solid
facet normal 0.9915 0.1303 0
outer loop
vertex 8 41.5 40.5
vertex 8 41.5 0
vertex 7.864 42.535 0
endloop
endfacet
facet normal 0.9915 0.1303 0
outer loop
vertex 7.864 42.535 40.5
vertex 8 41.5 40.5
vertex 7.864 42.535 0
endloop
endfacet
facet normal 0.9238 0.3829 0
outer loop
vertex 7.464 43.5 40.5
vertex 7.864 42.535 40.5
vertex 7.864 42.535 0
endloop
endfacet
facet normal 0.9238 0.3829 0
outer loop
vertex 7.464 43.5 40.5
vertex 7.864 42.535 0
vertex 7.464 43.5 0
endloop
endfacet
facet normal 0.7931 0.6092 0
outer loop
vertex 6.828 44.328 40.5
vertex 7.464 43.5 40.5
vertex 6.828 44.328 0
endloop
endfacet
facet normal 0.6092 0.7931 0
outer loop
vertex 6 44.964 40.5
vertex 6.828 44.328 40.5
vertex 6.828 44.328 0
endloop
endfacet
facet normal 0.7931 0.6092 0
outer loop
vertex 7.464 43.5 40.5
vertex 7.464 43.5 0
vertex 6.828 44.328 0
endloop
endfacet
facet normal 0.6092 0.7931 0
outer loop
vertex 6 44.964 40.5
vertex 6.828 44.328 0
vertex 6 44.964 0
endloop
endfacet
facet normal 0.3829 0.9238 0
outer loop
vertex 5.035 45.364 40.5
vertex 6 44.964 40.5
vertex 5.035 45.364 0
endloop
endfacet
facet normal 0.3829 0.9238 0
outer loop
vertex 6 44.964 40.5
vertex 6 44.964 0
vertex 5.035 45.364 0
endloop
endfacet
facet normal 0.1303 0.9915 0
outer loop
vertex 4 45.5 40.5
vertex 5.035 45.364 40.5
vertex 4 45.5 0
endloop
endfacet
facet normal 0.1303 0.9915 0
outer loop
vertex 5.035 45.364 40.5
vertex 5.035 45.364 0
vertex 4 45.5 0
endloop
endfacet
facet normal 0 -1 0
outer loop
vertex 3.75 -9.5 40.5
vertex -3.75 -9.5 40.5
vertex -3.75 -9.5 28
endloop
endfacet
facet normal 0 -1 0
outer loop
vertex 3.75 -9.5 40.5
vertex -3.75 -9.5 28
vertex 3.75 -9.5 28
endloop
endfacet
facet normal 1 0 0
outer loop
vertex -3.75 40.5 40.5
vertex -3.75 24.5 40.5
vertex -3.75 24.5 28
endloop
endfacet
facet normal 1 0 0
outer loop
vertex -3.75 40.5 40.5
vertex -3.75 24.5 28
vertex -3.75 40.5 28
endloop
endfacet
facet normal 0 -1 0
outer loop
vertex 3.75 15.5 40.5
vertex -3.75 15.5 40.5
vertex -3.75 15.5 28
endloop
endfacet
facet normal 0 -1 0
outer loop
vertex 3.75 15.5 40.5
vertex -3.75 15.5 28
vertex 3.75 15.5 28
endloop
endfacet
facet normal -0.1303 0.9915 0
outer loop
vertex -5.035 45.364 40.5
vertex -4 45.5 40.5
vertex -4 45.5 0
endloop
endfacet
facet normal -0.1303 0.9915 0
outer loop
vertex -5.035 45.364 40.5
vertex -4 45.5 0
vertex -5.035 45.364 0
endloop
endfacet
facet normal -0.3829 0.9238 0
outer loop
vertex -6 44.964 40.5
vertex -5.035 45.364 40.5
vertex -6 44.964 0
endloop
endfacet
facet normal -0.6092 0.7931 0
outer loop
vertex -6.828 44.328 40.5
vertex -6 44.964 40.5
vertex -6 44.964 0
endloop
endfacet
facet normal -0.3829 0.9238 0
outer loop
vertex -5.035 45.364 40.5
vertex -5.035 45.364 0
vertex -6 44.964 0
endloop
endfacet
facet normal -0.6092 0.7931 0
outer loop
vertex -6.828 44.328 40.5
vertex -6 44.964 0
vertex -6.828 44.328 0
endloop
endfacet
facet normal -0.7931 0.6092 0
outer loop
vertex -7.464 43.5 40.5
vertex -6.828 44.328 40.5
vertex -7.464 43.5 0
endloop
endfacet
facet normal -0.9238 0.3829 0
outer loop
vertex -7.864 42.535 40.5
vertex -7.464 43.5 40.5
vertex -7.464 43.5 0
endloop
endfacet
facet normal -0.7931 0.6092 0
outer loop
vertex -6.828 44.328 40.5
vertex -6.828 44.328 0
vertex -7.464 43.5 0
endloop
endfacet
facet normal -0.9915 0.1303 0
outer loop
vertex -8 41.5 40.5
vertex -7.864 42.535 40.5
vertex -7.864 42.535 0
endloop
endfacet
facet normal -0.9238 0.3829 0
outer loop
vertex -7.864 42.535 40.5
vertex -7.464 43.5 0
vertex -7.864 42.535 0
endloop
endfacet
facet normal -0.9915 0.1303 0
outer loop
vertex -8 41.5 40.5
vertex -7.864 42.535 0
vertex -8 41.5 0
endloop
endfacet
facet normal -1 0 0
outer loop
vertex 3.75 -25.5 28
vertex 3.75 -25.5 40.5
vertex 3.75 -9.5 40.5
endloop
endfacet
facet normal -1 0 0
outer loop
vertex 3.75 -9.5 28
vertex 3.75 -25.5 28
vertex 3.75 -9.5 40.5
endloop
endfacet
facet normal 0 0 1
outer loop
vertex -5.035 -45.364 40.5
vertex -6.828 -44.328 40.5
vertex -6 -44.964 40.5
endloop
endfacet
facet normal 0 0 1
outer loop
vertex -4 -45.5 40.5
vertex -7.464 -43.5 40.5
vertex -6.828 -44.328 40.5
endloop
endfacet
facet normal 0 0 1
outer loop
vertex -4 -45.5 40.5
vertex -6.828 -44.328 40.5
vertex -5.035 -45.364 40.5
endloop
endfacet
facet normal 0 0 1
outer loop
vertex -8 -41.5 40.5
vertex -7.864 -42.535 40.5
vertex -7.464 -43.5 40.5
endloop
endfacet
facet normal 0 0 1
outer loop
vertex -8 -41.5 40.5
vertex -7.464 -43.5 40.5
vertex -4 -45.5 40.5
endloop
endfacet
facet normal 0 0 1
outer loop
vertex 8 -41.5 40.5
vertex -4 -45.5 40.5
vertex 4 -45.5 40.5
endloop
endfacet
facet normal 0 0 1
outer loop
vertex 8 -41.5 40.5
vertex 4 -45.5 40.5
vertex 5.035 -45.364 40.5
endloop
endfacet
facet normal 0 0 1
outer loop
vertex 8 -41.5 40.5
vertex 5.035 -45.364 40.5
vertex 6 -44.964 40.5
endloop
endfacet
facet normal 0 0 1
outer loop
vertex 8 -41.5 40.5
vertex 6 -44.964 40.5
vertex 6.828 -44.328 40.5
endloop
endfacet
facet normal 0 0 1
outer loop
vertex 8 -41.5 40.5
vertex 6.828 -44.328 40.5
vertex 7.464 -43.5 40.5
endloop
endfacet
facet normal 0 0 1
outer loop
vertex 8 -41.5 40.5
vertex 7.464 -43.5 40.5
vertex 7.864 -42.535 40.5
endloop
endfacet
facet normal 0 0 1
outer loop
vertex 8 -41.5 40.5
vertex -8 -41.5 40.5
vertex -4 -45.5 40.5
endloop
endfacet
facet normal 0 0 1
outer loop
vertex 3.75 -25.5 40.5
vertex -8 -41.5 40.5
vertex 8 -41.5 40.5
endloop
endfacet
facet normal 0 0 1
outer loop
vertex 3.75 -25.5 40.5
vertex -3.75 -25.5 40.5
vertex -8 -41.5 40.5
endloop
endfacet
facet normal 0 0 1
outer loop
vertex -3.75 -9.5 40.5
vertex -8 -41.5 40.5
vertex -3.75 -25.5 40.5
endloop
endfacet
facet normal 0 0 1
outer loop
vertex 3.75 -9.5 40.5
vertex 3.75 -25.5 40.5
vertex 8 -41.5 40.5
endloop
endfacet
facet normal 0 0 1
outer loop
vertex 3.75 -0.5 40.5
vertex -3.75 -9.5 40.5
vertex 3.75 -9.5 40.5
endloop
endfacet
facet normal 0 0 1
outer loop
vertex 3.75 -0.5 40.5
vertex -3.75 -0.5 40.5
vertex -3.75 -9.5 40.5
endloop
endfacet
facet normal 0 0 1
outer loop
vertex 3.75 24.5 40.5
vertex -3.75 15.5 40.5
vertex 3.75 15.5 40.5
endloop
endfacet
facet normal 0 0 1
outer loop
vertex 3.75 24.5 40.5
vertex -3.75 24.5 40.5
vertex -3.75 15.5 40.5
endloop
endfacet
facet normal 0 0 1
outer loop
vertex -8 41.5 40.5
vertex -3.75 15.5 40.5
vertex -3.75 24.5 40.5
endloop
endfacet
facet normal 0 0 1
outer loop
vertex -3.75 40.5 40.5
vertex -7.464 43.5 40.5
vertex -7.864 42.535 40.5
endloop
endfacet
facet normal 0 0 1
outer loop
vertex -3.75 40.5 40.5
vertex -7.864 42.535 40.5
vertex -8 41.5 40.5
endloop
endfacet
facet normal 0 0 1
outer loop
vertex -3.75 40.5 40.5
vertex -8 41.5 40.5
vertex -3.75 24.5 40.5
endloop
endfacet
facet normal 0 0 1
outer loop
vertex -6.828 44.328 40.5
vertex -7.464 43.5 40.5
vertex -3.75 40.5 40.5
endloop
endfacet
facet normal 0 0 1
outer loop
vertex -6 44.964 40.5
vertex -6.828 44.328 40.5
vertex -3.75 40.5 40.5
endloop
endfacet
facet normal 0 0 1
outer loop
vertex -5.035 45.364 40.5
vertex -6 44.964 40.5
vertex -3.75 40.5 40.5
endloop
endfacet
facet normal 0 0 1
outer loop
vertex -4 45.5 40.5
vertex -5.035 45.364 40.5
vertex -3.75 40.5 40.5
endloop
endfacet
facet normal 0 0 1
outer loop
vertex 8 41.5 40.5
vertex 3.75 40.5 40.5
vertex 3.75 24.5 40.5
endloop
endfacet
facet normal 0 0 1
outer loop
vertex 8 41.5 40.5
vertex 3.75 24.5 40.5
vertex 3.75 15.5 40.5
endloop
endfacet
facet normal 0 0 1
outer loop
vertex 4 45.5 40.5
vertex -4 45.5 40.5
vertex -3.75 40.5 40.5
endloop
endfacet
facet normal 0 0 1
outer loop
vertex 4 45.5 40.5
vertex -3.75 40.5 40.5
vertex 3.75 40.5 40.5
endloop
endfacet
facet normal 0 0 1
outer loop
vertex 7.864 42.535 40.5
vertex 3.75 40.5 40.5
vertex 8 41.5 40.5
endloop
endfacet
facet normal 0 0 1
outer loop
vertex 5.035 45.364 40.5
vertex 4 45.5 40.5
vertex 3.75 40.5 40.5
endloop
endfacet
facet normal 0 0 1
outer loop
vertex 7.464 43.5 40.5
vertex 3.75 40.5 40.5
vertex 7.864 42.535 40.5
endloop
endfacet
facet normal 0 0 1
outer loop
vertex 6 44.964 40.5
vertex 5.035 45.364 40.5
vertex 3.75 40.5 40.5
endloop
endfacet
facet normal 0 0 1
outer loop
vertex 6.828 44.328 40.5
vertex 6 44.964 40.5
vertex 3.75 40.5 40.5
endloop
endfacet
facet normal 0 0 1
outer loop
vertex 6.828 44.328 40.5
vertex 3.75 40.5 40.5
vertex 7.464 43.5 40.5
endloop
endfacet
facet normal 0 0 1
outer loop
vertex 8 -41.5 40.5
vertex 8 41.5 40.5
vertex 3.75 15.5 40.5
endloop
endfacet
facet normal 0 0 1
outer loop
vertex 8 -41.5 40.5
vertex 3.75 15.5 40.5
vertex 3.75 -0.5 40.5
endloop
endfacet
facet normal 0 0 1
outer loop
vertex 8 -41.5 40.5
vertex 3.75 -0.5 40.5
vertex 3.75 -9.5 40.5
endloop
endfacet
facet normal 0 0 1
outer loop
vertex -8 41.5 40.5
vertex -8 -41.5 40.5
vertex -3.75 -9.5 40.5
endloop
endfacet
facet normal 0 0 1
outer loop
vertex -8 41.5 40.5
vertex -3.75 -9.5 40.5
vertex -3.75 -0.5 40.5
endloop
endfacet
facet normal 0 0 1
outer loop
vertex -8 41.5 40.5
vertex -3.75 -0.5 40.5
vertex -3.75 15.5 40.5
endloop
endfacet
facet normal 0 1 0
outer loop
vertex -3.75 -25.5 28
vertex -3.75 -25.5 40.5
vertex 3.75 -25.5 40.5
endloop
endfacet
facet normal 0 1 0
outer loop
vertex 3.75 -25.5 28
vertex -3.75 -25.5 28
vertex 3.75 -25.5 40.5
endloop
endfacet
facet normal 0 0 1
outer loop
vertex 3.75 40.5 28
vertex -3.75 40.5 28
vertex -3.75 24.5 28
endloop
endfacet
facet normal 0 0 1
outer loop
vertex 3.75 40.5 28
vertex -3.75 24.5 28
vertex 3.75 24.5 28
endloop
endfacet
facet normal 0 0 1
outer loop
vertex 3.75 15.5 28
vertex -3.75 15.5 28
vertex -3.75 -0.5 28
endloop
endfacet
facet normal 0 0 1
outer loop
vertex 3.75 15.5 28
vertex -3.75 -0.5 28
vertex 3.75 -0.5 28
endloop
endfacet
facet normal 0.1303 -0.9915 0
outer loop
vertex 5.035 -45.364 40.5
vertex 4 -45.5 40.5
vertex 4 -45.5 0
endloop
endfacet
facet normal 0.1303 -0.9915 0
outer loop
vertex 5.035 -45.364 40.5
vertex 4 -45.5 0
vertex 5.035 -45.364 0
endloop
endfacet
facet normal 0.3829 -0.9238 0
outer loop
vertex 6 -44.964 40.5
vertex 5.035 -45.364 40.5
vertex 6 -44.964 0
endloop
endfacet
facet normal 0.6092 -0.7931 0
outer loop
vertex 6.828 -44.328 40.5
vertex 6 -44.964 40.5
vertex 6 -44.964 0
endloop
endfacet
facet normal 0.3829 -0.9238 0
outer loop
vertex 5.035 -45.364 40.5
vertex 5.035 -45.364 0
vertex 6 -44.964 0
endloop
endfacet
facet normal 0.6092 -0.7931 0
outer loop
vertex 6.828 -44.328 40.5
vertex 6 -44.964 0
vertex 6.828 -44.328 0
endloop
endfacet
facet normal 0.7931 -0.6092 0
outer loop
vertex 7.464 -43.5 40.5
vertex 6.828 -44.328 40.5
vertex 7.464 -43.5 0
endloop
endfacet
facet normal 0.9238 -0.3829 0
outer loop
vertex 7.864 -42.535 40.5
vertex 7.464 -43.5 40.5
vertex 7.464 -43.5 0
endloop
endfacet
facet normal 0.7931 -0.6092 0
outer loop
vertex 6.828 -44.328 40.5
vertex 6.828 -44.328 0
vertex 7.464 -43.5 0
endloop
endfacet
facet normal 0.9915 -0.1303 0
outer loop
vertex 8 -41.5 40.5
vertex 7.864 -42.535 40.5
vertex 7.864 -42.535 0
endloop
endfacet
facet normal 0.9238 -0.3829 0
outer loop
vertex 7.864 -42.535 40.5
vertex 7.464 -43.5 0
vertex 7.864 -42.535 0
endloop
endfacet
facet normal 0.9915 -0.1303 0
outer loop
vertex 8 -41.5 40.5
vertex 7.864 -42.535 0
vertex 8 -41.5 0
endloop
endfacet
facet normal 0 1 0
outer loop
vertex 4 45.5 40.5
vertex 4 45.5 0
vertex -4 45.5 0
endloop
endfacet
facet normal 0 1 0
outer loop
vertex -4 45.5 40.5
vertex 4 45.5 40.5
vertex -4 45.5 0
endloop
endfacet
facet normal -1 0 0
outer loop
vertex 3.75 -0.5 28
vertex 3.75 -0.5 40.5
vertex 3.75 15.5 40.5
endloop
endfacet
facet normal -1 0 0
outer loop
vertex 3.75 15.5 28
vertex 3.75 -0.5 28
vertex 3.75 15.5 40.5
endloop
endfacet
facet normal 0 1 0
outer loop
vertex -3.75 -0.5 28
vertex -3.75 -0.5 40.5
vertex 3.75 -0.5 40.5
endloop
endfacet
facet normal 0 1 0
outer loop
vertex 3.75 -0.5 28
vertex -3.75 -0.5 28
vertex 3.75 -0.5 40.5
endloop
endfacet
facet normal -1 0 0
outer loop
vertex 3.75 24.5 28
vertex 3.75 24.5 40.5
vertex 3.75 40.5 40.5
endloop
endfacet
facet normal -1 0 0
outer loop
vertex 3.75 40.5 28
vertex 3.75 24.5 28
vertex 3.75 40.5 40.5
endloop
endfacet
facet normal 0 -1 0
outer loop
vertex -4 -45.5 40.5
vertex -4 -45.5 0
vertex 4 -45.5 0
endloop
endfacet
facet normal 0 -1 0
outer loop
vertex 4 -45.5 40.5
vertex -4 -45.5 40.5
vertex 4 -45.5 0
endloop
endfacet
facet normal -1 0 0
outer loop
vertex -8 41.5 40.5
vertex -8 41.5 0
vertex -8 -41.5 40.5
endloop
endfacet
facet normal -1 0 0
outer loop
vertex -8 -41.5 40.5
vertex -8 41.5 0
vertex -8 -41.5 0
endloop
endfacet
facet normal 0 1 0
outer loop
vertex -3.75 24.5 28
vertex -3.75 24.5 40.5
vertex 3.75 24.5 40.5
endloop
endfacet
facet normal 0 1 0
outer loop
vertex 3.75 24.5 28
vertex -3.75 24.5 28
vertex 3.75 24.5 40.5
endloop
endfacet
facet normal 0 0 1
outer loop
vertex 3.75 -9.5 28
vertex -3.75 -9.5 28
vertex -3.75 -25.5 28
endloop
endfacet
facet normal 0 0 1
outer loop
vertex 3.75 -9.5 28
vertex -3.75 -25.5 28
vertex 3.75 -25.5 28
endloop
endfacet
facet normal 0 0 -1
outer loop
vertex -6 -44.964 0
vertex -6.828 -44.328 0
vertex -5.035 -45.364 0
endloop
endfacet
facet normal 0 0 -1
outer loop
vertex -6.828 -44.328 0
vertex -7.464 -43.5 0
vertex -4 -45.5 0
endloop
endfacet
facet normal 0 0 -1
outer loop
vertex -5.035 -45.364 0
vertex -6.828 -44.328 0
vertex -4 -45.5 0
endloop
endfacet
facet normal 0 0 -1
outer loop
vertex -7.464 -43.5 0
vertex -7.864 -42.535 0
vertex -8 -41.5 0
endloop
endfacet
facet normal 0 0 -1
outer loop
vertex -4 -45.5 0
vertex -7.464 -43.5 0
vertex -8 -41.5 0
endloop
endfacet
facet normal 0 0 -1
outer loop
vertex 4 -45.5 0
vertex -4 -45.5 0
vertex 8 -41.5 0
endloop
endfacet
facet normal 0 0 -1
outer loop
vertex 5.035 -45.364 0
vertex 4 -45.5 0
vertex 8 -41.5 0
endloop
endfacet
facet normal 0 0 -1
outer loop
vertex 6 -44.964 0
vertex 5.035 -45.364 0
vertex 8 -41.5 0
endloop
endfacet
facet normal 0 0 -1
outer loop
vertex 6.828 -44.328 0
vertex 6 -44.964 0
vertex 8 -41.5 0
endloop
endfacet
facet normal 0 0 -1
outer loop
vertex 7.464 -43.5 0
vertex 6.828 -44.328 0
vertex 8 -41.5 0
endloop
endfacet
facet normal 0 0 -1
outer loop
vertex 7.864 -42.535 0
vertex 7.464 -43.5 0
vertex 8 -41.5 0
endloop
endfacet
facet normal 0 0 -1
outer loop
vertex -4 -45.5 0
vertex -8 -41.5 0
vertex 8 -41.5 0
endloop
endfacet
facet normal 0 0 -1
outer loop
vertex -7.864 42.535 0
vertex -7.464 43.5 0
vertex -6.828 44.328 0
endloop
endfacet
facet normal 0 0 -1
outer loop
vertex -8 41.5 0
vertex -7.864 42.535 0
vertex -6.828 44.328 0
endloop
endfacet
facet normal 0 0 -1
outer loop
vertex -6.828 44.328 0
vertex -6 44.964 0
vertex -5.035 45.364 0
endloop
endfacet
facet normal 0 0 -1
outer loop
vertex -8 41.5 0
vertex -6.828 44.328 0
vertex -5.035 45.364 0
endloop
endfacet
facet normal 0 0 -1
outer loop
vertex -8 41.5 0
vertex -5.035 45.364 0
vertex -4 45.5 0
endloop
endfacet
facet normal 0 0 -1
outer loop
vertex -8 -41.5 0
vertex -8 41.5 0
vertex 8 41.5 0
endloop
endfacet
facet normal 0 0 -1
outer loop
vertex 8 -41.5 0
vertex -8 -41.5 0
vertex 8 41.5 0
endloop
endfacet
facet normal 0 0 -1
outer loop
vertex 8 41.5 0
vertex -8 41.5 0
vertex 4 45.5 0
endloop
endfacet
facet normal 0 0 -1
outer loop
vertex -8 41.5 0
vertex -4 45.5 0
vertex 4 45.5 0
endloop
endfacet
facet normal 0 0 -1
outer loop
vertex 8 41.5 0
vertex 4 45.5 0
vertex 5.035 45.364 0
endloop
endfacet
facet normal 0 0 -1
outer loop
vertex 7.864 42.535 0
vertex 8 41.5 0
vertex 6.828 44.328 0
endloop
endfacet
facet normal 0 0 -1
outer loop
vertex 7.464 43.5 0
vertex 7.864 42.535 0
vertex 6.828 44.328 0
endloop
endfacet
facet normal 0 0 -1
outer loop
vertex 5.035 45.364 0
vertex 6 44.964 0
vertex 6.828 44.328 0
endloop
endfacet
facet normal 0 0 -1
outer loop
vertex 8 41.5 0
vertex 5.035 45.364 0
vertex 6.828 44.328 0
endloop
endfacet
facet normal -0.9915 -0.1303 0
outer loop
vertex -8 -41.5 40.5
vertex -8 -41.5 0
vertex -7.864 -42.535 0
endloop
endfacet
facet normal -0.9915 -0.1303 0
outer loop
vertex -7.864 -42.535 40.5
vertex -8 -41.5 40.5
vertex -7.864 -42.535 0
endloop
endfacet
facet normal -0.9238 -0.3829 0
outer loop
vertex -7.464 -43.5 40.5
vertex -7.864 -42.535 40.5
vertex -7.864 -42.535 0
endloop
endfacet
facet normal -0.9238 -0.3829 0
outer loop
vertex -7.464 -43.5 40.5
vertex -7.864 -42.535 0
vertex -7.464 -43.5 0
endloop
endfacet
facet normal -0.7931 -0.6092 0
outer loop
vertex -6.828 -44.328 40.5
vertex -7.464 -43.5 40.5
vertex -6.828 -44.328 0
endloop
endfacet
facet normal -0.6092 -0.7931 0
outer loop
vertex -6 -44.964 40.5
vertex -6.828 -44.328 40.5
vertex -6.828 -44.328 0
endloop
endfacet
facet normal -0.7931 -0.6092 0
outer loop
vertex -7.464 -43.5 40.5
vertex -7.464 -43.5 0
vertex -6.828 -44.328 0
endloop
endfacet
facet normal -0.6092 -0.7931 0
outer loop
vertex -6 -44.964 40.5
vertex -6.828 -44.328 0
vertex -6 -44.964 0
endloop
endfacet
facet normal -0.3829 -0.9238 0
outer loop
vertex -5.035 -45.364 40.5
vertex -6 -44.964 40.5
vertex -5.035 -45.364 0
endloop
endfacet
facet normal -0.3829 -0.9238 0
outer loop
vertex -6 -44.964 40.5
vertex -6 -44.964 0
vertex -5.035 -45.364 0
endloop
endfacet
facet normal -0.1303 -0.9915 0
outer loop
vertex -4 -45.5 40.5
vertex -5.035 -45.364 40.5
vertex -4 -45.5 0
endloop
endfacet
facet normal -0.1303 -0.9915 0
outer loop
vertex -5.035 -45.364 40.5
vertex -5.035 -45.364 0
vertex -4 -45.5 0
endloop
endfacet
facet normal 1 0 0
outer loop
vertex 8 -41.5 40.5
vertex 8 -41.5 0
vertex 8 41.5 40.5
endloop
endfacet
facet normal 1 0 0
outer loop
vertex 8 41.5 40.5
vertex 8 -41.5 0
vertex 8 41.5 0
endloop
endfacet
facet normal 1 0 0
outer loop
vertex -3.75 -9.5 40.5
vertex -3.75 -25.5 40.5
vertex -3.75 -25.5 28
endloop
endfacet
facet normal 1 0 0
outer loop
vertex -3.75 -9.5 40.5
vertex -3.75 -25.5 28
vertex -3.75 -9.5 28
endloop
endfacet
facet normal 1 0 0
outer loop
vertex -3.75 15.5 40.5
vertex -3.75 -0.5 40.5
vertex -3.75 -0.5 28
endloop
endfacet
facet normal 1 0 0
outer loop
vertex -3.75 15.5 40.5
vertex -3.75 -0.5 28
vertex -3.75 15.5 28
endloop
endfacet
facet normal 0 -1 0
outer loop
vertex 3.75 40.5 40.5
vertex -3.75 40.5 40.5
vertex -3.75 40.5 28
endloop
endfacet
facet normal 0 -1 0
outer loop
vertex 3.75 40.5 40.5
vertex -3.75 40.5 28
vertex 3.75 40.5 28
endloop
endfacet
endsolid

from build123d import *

# Parameters (mm, degrees)
BOSS_EXTRUDE1_DEPTH = 40.5
SKETCH2_W           = 7.5
SKETCH2_H           = 16
CUT_EXTRUDE1_DEPTH  = 12.5


with BuildPart() as part:
    # Sketch1 → Boss-Extrude1 (new body)
    with BuildSketch(Plane.XY):
        with BuildLine():
            Line((-4, -45.5), (4, -45.5))
            ThreePointArc((4, -45.5), (6.828427125, -44.328427125), (8, -41.5))
            Line((8, -41.5), (8, 41.5))
            ThreePointArc((8, 41.5), (6.828427125, 44.328427125), (4, 45.5))
            Line((4, 45.5), (-4, 45.5))
            ThreePointArc((-4, 45.5), (-6.828427125, 44.328427125), (-8, 41.5))
            Line((-8, 41.5), (-8, -41.5))
            ThreePointArc((-8, -41.5), (-6.828427125, -44.328427125), (-4, -45.5))
        make_face()
    extrude(amount=BOSS_EXTRUDE1_DEPTH)

    # Sketch2 → Cut-Extrude1 (cut)
    with BuildSketch(Plane.XY.offset(40.5)):
        with Locations((0, 7.5)):
            Rectangle(SKETCH2_W, SKETCH2_H)
        with Locations((0, 32.5)):
            Rectangle(SKETCH2_W, SKETCH2_H)
        with Locations((0, -17.5)):
            Rectangle(SKETCH2_W, SKETCH2_H)
    extrude(amount=-CUT_EXTRUDE1_DEPTH, mode=Mode.SUBTRACT)


solid = part.part
